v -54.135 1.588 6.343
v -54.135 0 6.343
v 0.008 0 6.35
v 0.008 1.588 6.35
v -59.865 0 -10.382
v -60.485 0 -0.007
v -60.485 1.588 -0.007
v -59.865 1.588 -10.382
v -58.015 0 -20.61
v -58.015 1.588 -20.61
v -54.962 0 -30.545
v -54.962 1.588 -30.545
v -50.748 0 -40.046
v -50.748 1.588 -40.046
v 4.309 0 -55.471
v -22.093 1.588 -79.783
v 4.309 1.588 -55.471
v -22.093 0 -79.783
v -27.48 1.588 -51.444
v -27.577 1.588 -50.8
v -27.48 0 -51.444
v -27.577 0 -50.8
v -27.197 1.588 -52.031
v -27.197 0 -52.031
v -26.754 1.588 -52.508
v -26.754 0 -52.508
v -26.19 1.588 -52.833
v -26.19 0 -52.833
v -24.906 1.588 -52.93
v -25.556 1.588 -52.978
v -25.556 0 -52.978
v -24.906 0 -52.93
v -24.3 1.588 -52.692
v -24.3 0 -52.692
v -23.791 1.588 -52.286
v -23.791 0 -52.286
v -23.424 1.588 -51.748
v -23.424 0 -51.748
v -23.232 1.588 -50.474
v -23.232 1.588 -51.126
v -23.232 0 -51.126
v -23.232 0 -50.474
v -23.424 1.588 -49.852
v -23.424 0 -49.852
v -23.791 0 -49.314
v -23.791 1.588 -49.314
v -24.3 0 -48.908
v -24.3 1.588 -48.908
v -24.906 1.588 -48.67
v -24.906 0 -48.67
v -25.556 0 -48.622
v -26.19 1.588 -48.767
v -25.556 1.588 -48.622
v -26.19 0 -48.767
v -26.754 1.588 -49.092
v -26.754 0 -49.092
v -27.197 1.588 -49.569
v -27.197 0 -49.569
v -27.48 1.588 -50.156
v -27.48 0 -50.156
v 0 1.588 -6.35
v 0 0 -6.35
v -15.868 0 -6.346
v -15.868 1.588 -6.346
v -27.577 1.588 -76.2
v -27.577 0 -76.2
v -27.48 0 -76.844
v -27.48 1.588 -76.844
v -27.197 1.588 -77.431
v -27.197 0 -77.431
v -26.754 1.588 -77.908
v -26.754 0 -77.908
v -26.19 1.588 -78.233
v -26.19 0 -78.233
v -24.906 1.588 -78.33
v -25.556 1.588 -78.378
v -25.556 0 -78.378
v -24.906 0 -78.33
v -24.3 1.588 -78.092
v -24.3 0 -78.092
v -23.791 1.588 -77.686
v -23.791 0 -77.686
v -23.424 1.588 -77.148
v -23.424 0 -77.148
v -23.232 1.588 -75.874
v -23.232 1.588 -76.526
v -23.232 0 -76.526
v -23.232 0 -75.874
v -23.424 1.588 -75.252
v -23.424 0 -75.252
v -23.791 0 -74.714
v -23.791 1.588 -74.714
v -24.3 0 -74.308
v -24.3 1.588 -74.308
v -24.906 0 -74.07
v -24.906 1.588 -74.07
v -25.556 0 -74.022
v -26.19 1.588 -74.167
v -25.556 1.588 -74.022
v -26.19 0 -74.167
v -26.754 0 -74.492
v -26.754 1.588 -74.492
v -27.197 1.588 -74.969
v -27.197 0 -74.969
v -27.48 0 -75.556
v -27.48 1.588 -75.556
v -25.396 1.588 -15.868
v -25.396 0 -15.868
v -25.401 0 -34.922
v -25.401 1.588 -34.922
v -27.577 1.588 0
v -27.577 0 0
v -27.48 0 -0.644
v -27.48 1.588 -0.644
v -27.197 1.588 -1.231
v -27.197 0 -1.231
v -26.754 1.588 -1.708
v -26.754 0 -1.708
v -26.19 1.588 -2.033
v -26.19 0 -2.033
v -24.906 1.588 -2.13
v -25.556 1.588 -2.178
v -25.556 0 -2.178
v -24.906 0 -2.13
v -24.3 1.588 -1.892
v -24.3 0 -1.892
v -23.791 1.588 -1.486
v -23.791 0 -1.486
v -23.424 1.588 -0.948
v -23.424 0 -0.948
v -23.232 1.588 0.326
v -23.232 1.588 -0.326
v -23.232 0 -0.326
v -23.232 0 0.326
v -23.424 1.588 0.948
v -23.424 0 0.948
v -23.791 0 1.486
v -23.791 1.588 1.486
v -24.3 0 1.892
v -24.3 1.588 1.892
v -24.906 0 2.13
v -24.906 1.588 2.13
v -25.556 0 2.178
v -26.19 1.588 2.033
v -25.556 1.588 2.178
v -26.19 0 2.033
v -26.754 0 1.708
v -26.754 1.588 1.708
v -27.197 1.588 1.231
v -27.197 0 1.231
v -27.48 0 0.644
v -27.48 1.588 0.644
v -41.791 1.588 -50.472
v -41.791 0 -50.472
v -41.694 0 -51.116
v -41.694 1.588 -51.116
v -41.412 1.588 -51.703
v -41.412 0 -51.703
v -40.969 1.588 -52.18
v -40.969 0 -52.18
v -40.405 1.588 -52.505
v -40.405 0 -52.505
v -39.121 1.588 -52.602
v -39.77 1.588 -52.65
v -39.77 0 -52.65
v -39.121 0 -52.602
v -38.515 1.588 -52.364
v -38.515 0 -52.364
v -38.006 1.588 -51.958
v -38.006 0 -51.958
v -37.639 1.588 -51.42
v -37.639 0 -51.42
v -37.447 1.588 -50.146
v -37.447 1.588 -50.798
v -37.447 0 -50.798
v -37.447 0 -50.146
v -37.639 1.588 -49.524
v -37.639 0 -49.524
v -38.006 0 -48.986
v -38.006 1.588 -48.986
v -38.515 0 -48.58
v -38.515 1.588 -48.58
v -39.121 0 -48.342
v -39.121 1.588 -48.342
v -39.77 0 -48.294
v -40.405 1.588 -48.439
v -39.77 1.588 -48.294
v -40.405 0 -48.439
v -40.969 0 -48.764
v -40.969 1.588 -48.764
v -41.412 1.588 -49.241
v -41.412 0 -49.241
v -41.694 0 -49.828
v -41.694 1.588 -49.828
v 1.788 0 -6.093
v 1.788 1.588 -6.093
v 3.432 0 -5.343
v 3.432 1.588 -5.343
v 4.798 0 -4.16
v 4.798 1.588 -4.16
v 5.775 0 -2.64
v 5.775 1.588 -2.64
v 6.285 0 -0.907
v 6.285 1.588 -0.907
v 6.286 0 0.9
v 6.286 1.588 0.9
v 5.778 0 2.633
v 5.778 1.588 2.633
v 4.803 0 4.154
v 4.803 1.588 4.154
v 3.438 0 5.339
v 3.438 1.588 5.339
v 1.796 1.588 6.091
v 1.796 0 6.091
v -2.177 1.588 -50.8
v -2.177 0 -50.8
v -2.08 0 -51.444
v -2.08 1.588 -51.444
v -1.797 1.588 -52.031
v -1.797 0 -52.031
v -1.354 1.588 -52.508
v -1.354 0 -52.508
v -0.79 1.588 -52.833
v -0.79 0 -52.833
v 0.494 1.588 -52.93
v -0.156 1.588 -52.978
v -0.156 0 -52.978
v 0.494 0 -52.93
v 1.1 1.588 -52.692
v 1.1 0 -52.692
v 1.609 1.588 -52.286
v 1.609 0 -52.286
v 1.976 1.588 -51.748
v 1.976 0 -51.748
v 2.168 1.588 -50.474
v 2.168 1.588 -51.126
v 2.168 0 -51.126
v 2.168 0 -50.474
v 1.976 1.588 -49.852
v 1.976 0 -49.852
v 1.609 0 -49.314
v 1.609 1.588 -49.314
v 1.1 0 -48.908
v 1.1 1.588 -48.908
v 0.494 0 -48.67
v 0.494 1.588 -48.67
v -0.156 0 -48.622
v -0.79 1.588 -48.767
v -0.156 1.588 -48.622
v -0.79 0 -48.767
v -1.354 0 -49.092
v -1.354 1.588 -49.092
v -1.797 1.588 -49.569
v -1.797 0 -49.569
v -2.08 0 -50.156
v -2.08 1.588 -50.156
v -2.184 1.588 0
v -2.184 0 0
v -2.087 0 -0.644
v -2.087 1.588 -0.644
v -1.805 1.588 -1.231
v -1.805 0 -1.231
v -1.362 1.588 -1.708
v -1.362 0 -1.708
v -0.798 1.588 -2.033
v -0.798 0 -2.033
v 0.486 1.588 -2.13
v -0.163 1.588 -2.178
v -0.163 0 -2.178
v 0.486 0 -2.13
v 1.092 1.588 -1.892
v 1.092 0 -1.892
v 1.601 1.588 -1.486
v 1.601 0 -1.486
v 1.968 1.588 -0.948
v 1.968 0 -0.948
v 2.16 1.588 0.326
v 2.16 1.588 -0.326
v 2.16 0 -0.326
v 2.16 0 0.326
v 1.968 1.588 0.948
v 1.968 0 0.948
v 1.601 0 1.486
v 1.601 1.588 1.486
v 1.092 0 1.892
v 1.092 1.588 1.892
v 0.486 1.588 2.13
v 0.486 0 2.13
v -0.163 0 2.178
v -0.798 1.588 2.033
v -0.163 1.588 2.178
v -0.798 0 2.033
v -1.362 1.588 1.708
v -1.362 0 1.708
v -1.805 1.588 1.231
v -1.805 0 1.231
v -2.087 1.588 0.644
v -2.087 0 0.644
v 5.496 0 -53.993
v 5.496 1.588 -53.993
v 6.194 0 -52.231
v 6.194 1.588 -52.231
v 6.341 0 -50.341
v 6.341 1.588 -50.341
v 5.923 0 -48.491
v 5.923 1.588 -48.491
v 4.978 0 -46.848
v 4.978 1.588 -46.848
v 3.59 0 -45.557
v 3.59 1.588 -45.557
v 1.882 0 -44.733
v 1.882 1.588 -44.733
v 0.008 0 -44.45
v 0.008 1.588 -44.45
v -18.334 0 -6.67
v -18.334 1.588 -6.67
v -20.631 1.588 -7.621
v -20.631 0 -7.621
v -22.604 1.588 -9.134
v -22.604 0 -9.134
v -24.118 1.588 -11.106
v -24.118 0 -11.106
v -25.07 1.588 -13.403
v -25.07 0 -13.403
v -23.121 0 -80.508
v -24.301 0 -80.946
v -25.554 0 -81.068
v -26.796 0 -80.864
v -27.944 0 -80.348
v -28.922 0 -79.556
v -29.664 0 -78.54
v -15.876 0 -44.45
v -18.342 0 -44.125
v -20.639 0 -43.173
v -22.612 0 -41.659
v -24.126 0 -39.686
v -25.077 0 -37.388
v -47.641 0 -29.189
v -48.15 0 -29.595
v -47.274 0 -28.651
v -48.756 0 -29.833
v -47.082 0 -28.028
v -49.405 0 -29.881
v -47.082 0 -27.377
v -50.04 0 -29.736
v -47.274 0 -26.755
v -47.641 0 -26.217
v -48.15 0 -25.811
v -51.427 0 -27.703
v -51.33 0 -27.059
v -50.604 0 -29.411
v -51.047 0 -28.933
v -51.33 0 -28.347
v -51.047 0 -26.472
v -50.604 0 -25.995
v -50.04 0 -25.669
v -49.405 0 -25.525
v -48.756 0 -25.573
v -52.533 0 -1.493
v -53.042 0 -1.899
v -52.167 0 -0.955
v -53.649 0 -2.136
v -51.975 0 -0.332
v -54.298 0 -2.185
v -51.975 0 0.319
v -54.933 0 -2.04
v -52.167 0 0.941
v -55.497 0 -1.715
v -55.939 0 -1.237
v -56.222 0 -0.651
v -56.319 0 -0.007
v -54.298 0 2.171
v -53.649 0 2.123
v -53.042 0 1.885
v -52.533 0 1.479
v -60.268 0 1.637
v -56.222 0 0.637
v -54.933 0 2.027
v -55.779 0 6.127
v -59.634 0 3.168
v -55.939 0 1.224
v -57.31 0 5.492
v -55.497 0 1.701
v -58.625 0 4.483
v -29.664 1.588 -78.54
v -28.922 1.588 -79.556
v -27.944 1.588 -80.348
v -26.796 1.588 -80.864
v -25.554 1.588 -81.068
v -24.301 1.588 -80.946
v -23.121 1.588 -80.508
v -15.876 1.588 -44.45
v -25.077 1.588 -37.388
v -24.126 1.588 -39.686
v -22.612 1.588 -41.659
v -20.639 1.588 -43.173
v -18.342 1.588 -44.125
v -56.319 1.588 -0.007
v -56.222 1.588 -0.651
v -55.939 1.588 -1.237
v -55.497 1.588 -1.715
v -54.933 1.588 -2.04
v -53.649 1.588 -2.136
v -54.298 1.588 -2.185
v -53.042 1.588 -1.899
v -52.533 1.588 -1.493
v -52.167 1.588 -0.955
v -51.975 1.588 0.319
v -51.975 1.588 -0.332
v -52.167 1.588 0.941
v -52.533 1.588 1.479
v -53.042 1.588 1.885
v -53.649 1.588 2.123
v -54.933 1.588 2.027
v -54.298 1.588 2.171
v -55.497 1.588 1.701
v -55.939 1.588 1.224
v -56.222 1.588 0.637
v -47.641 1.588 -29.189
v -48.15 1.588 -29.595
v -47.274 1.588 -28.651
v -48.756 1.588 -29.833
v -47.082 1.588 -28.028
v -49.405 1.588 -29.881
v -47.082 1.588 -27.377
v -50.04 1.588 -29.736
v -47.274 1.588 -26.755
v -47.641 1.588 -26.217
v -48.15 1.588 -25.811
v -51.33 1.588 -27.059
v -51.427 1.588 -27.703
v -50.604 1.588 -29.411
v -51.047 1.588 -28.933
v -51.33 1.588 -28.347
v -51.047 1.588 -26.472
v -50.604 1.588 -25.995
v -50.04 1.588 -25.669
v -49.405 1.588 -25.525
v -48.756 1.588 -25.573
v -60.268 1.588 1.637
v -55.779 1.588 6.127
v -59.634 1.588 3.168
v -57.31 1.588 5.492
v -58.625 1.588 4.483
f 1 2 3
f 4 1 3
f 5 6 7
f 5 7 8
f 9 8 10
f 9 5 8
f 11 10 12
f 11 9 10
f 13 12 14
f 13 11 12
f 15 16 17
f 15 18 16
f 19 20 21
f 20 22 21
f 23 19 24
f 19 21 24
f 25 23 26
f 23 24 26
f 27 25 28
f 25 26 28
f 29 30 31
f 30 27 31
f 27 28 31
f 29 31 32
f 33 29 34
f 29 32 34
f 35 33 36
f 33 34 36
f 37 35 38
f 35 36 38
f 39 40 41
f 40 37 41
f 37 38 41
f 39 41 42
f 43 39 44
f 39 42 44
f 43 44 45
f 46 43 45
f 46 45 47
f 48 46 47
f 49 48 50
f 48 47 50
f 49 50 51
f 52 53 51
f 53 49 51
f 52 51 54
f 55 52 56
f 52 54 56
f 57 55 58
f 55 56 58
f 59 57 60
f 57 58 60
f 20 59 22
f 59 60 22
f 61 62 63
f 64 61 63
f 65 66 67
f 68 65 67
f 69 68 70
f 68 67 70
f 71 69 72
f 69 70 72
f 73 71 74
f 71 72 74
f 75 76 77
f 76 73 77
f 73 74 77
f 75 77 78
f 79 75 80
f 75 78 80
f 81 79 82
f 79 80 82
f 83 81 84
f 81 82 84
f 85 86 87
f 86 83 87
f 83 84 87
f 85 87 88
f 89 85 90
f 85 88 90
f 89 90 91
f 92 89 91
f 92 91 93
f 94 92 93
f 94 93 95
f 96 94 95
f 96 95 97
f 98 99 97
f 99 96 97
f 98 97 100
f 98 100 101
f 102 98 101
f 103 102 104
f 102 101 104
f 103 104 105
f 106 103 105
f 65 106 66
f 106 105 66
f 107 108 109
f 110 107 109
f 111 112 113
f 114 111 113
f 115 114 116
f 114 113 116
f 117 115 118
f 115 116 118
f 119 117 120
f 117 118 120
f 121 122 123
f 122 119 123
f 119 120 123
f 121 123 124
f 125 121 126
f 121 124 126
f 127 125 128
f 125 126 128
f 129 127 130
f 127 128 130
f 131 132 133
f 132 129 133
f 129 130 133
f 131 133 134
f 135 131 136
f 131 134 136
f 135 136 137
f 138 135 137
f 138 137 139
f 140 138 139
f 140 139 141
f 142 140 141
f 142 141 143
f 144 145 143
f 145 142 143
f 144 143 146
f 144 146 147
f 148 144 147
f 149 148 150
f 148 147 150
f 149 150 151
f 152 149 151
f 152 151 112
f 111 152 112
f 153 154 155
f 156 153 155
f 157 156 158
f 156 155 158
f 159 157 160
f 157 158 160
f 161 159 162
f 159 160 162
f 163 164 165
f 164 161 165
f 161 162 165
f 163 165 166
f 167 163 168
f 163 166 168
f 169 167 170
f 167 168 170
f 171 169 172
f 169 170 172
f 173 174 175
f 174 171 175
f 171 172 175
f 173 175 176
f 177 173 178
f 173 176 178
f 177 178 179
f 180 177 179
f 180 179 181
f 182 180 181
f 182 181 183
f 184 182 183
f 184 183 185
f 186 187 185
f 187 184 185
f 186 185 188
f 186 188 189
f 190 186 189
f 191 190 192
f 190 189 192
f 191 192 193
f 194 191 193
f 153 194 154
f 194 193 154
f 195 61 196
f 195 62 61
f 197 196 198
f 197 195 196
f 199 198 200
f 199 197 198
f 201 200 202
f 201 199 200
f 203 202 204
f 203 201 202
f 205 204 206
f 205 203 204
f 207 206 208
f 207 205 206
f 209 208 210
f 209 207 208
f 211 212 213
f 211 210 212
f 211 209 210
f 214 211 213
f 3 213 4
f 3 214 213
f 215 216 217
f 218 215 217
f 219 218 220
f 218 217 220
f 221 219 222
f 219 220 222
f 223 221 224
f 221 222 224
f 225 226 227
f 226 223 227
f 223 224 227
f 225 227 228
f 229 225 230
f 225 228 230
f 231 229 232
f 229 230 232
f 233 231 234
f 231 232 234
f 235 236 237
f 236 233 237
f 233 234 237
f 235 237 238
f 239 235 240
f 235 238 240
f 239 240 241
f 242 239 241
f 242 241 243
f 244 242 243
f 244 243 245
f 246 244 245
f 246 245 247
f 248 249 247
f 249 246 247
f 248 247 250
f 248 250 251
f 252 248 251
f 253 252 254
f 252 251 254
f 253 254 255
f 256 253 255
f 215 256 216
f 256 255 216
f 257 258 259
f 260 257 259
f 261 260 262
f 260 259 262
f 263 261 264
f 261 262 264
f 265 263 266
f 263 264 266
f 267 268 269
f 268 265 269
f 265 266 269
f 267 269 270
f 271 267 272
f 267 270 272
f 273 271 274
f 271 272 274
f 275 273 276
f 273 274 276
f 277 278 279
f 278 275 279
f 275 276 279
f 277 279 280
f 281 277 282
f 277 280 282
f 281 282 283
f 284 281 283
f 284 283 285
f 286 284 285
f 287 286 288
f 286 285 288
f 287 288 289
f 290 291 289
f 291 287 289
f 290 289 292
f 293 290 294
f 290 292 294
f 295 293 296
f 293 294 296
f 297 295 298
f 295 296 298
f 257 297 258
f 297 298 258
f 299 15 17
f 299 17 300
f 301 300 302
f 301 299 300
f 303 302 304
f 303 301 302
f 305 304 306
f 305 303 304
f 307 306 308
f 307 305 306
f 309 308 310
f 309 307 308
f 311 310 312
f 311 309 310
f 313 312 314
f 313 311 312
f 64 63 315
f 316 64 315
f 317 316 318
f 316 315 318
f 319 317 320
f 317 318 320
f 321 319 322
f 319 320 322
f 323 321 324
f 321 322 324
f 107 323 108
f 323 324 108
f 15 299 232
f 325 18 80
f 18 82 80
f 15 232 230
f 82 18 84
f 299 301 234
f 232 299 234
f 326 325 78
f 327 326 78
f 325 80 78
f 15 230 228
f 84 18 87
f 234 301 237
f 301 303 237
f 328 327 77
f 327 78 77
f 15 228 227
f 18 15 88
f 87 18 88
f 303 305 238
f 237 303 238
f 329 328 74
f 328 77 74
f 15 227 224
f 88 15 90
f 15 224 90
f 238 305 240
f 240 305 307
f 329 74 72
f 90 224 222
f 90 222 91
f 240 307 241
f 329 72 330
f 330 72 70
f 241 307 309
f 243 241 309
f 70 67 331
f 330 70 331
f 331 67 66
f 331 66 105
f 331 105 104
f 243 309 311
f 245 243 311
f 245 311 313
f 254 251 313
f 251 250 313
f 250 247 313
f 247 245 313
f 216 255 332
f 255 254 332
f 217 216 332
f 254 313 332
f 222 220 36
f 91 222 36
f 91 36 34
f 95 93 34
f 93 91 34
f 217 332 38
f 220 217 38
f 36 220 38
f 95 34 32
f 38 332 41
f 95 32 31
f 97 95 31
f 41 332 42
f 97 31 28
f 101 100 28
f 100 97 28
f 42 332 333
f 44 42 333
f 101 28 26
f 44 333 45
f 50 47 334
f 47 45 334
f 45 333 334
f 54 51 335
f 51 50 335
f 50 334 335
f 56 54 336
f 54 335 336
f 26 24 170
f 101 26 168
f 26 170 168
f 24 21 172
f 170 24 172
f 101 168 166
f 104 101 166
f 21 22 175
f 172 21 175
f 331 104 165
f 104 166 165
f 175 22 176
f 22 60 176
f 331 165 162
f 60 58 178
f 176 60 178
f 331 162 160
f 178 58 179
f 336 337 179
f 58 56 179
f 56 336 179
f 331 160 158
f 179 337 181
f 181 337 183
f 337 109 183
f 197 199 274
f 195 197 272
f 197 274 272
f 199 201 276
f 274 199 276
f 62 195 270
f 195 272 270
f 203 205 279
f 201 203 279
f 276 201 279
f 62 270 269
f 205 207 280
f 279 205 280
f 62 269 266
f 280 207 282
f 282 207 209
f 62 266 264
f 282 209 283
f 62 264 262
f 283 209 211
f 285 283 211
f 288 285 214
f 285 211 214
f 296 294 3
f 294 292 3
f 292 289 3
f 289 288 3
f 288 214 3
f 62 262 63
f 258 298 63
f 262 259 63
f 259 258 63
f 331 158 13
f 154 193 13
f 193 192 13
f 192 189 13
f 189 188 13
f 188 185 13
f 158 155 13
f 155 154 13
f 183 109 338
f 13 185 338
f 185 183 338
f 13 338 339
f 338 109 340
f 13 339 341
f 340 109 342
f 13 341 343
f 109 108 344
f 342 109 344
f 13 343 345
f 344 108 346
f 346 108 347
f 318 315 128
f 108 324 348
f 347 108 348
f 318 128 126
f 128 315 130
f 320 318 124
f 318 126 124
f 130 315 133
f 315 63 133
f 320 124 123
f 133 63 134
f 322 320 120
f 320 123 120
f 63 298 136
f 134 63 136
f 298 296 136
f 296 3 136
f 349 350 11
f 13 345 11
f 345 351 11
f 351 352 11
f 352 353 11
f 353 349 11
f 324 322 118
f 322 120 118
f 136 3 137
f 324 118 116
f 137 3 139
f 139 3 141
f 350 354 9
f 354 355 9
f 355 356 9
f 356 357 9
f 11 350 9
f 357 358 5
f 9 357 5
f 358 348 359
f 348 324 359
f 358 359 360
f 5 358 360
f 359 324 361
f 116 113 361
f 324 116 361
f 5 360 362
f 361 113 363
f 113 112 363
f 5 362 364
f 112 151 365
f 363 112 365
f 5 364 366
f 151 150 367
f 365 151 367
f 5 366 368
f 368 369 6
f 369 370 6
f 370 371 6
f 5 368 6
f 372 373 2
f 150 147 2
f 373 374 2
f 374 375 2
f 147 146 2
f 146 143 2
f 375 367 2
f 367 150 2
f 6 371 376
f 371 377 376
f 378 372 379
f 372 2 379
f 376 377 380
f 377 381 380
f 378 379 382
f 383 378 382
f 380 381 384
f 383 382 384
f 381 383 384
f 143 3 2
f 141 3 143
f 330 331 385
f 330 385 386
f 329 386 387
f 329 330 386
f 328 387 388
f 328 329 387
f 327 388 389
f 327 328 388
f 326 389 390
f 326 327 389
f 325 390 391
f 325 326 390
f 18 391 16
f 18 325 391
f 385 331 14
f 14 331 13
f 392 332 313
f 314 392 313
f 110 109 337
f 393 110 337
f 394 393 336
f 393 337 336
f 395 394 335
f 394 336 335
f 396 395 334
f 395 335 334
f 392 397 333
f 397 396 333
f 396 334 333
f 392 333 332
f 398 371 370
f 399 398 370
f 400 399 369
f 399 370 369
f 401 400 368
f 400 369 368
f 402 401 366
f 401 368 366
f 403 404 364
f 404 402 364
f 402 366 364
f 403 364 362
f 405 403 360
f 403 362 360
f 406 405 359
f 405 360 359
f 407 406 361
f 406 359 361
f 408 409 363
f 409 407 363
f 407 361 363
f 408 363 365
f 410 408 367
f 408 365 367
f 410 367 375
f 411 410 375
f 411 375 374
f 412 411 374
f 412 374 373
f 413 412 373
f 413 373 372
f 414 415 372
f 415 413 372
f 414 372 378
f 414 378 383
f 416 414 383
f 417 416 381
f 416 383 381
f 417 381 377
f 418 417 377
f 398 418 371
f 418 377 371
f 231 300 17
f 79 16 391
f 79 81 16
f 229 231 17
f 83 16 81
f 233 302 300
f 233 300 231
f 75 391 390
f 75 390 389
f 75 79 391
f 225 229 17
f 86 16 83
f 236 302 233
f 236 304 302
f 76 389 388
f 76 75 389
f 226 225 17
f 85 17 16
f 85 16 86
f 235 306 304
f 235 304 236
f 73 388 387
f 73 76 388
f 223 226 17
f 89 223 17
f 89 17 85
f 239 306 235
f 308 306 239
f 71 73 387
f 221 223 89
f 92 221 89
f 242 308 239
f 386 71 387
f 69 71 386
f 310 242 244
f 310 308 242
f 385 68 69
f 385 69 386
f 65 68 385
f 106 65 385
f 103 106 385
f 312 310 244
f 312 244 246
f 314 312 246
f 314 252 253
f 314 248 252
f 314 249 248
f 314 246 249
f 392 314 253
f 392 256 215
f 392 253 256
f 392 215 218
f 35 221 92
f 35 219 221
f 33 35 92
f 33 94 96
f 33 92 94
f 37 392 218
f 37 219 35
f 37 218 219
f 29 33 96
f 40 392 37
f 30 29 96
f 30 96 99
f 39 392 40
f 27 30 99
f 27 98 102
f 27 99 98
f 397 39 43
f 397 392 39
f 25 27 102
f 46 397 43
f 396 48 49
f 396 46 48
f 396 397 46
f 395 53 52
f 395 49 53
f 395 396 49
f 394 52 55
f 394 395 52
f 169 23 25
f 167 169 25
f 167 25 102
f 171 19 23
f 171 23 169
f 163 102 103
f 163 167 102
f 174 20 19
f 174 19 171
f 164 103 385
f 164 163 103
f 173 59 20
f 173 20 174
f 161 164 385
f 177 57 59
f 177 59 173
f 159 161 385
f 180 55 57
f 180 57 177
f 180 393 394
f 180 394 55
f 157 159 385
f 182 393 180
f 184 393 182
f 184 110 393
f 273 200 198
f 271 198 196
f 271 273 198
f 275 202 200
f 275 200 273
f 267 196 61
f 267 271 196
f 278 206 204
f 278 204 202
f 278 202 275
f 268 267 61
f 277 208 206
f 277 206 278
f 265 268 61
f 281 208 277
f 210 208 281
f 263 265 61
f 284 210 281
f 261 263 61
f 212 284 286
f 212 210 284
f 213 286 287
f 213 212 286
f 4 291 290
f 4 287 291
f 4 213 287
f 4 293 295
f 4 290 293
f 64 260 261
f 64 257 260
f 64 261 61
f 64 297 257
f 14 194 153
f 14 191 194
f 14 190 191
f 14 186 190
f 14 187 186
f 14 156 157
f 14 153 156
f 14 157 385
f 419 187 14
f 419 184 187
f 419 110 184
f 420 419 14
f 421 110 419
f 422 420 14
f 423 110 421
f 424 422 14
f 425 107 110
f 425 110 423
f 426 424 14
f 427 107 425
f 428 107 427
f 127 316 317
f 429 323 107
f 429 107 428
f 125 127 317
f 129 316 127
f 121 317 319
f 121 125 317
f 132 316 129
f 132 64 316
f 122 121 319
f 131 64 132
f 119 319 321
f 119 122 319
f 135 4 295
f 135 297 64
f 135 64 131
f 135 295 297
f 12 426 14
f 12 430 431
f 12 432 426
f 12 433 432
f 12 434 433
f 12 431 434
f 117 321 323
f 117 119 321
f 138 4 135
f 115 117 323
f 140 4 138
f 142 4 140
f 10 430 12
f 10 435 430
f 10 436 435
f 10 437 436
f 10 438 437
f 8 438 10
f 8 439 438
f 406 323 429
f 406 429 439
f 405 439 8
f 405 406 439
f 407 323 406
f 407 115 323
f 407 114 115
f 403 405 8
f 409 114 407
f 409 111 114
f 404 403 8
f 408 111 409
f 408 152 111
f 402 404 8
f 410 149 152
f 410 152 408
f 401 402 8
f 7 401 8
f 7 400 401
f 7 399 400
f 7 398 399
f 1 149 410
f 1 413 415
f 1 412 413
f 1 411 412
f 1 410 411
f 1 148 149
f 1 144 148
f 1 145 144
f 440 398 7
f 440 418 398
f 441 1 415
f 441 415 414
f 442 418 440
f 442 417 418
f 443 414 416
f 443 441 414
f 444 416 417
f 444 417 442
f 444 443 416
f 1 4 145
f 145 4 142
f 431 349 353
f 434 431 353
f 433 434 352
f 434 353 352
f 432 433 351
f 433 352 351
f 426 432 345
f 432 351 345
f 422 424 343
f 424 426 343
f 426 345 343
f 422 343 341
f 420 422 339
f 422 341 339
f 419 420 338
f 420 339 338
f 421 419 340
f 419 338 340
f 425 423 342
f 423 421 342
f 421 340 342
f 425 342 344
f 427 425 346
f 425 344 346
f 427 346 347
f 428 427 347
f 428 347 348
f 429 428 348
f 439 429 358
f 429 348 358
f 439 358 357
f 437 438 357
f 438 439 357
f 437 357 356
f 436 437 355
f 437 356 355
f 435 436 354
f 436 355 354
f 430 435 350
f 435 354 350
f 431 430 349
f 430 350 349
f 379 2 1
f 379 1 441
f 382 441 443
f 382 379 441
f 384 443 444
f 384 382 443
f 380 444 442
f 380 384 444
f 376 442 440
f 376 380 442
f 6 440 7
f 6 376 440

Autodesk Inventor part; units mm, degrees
ref_plane "YZ Plane" through (0, 0, 0) normal (1, 0, 0) x (0, 1, 0)
ref_plane "XZ Plane" through (0, 0, 0) normal (0, 1, 0) x (-1, 0, 0)
ref_plane "XY Plane" through (0, 0, 0) normal (0, 0, 1) x (1, 0, 0)
sketch "main" plane through (0, 0, 0) normal (0, 0, 1) x (1, 0, 0)
  line L0 (12.0188, -14.2552) -> (33.1027, 24.2387)
  circle A0 centre (21.9619, 13.8124) radius 2.1844
  circle A1 centre (31.5972, 36.5815) radius 2.1844
  circle A2 centre (36.4896, 64.2776) radius 2.1844
  line L1 (36.4904, 70.6276) -> (-17.6528, 70.6344)
  circle A3 centre (7.7473, 64.2844) radius 2.1844
  line L2 (7.7507, 48.4162) -> (7.7558, 29.3619)
  arc A4 (7.7507, 48.4162) -> (-1.7768, 57.9386) centre (-1.7743, 48.4136) ccw
  arc A5 (-1.7692, 19.8344) -> (7.7558, 29.3619) centre (-1.7692, 29.3594) ccw
  line L3 (-17.645, 57.9344) -> (-1.7768, 57.9386)
  arc A6 (-17.6528, 70.6344) -> (-17.645, 57.9344) centre (-17.645, 64.2844) ccw
  arc A7 (-17.6527, 19.8344) -> (-21.9541, 8.8131) centre (-17.6527, 13.4844) ccw
  circle A8 centre (7.7473, 13.4844) radius 2.1844
  line L4 (-1.7692, 19.8344) -> (-17.6527, 19.8344)
  arc A9 (4.4483, -15.4983) -> (12.0188, -14.2552) centre (7.7473, -11.9156) ccw
  line L5 (4.4483, -15.4983) -> (-21.9541, 8.8131)
  circle A10 centre (7.7473, -11.9156) radius 2.1844
  circle A11 centre (-17.645, 64.2844) radius 2.1844
  circle A12 centre (-17.6527, 13.4844) radius 2.1844
  arc A13 (42.8396, 64.2776) -> (36.4904, 70.6276) centre (36.4896, 64.2776) ccw
  arc A14 (33.1027, 24.2387) -> (42.8396, 64.2776) centre (-44.3506, 64.2776) ccw
  point P0 (10.5119, 26.5593)
  dimension "d1" = 9.7405
  dimension "d2" = 4.3688
  dimension "d3" = 4.3688
  dimension "d4" = 4.3688
  dimension "d5" = 4.3688
  dimension "d6" = 4.3688
  dimension "d10" = 50.8
  dimension "d11" = 50.8
  dimension "d13" = 6.35
sketch "Sketch1" plane through (0, 0, 0) normal (0, 1, 0) x (-1, 0, 0)
  line L0 (29.6638, -78.5396) -> (50.7478, -40.0457)
  circle A0 centre (39.607, -50.472) radius 2.1844
  circle A1 centre (49.2422, -27.7029) radius 2.1844
  circle A2 centre (54.1346, -0.0068) radius 2.1844
  line L1 (54.1354, 6.3432) -> (-0.0077, 6.35)
  circle A3 centre (25.3923, 0) radius 2.1844
  line L2 (25.3957, -15.8682) -> (25.4009, -34.9224)
  arc A4 (25.3957, -15.8682) -> (15.8682, -6.3457) centre (15.8707, -15.8707) ccw
  arc A5 (15.8759, -44.45) -> (25.4009, -34.9224) centre (15.8759, -34.925) ccw
  line L3 (0, -6.35) -> (15.8682, -6.3457)
  arc A6 (-0.0077, 6.35) -> (0, -6.35) centre (0, 0) ccw
  arc A7 (-0.0077, -44.45) -> (-4.309, -55.4713) centre (-0.0077, -50.8) ccw
  circle A8 centre (25.3923, -50.8) radius 2.1844
  line L4 (15.8759, -44.45) -> (-0.0077, -44.45)
  arc A9 (22.0933, -79.7827) -> (29.6638, -78.5396) centre (25.3923, -76.2) ccw
  line L5 (22.0933, -79.7827) -> (-4.309, -55.4713)
  circle A10 centre (25.3923, -76.2) radius 2.1844
  circle A11 centre (0, 0) radius 2.1844
  circle A12 centre (-0.0077, -50.8) radius 2.1844
  arc A13 (60.4846, -0.0068) -> (54.1354, 6.3432) centre (54.1346, -0.0068) ccw
  arc A14 (50.7478, -40.0457) -> (60.4846, -0.0068) centre (-26.7056, -0.0068) ccw
extrude "Extrusion1" add sketch "Sketch1" along normal blind 1.5875
properties part number "Funnel Gusset Back Improved V2" material "Acetal Resin, White"
